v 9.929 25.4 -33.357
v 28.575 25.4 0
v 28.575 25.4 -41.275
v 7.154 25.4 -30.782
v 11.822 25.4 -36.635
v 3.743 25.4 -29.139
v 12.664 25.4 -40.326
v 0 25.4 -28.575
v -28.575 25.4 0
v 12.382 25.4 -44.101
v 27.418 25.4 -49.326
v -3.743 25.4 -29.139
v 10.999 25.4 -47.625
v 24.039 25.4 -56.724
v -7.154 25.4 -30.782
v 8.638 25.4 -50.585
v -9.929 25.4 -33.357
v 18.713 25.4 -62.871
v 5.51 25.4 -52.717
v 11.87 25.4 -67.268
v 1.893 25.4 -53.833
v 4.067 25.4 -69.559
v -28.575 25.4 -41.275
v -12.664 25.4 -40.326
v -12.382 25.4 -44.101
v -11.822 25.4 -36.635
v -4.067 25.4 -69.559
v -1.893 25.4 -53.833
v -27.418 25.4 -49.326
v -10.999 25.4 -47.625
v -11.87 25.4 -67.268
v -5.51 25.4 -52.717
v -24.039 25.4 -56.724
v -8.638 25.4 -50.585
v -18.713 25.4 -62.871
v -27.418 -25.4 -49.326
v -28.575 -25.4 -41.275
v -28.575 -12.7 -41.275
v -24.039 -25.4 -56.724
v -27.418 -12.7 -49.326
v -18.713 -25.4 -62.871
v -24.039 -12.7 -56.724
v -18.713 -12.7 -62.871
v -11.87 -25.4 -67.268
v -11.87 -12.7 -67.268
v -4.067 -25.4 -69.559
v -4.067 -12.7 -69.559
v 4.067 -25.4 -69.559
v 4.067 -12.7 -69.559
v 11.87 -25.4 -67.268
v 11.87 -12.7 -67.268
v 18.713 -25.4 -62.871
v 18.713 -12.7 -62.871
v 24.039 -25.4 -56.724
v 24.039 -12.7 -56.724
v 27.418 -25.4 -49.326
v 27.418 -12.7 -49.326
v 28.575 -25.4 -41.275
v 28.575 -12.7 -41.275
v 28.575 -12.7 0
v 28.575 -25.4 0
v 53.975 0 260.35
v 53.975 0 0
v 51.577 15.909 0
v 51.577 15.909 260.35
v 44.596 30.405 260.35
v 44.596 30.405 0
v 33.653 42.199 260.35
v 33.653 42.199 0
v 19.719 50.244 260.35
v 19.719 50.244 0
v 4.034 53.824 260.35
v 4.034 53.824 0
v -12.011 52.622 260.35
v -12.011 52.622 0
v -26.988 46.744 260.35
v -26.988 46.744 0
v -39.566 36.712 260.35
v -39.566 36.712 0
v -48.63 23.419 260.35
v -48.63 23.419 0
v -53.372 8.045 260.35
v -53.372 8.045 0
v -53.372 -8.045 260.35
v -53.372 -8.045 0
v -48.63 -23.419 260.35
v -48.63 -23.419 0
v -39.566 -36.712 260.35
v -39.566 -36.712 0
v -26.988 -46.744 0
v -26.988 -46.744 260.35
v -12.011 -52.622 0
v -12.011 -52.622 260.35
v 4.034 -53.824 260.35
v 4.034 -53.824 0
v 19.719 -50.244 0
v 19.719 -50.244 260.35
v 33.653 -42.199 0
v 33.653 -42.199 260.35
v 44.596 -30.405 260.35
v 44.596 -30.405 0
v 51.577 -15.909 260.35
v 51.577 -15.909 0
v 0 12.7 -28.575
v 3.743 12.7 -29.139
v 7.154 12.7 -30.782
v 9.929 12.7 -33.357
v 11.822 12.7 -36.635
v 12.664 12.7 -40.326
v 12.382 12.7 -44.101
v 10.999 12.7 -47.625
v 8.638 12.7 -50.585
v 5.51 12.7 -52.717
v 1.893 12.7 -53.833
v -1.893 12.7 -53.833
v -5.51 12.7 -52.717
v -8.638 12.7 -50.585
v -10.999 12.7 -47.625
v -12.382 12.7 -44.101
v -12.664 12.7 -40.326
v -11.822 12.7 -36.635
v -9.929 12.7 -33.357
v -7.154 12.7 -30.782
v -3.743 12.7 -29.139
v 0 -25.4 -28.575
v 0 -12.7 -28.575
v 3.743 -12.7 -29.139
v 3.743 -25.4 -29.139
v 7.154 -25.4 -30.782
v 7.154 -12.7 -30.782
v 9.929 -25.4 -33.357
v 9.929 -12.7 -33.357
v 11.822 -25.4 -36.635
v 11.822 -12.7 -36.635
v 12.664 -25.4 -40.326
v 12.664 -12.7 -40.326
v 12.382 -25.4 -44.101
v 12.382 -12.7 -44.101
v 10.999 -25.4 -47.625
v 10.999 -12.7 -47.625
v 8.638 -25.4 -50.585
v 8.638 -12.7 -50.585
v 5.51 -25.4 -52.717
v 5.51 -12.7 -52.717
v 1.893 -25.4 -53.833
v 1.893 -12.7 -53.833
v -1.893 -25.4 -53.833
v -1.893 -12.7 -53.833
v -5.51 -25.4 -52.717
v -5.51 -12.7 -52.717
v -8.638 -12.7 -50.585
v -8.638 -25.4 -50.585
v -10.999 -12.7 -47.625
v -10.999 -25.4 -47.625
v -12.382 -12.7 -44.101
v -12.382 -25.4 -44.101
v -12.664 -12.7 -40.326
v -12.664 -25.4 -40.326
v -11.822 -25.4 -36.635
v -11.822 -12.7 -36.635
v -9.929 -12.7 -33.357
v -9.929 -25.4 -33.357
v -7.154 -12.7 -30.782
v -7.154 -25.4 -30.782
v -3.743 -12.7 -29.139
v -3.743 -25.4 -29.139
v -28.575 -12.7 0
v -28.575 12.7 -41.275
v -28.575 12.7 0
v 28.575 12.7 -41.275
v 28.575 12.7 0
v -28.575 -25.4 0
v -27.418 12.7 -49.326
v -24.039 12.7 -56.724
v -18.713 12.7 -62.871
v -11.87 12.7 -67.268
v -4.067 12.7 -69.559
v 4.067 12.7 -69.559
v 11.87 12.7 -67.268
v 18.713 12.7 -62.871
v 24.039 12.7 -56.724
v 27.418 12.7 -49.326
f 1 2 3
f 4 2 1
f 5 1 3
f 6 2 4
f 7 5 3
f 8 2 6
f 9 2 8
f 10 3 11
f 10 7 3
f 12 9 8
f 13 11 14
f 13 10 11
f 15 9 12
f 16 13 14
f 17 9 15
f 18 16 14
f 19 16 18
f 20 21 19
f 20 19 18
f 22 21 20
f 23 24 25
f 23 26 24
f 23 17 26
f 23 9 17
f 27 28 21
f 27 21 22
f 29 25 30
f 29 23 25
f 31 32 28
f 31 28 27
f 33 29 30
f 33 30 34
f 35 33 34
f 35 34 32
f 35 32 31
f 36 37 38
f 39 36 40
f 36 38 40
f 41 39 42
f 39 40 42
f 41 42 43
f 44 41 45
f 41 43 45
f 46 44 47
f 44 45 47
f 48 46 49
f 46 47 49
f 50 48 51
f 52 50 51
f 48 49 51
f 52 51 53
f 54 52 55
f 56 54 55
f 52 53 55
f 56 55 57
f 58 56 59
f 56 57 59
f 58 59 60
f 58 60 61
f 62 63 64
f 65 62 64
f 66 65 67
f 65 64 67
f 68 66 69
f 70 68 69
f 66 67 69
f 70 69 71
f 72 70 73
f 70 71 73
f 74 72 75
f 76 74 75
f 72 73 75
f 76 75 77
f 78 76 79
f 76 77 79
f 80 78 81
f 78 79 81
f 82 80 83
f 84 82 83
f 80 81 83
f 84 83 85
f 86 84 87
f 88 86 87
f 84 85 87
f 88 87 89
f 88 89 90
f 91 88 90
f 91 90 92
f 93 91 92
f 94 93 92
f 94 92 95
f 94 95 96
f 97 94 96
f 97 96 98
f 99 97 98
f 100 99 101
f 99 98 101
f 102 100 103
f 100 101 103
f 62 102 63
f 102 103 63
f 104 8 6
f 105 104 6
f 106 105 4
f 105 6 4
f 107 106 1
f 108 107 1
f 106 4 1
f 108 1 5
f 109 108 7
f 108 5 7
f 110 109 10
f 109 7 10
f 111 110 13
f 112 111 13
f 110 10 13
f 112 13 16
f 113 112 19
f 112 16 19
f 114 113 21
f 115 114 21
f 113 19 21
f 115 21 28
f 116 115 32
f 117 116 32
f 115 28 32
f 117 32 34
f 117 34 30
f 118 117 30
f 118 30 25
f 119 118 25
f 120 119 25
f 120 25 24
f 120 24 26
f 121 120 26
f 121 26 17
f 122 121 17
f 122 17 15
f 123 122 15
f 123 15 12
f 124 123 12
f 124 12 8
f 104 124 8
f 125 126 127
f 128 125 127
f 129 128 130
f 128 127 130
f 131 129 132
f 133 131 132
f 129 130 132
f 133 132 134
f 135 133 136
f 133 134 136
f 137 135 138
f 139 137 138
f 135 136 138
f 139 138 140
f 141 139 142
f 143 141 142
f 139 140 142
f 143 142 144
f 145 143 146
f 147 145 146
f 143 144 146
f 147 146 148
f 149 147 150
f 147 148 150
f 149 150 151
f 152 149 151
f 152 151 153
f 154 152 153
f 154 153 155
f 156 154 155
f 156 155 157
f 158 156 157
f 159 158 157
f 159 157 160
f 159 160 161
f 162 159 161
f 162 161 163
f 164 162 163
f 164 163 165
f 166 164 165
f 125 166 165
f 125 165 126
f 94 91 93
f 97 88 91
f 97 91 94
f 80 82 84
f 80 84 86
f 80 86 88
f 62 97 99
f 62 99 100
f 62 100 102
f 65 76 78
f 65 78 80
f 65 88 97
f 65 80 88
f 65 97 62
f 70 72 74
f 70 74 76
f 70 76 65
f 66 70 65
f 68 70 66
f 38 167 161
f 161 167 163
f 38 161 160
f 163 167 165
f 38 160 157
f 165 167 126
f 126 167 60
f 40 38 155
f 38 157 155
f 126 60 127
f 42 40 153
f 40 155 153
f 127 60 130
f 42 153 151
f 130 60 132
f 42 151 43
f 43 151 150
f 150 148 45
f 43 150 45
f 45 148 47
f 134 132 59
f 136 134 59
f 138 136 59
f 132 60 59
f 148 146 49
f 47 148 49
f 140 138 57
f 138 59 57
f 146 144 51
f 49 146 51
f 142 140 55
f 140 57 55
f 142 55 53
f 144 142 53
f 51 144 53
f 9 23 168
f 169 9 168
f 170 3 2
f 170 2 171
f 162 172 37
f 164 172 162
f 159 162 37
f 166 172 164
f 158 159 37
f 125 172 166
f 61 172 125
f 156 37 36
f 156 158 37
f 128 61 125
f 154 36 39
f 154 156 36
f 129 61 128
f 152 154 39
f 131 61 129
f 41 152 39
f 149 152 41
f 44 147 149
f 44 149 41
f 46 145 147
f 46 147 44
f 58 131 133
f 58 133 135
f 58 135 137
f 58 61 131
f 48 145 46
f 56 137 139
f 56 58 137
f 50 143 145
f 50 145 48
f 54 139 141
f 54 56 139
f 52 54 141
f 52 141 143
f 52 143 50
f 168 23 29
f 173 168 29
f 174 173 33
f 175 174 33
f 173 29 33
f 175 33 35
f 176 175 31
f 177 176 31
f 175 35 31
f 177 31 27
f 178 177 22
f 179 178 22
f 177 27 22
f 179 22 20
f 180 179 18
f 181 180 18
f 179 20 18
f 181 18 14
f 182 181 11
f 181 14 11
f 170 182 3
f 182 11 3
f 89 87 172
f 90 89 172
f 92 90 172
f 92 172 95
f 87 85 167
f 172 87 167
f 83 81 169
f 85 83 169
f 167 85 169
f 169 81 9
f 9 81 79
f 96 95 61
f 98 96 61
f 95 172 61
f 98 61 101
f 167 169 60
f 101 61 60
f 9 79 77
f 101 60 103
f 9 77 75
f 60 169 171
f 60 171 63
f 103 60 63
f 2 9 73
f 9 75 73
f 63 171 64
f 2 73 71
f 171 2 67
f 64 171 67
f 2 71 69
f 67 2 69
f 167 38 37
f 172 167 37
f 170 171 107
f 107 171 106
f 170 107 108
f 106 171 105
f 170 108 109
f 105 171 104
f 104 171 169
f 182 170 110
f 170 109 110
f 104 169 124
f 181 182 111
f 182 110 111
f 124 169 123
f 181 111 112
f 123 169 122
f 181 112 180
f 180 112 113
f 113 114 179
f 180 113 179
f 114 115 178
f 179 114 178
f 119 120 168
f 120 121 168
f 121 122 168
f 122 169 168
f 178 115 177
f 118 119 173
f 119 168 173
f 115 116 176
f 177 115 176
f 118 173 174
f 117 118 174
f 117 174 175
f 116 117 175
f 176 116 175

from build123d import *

# Parameters (mm, degrees)
SKETCH1_R          = 53.975
EXTRUDE1_DEPTH     = 260.35
SKETCH2_W          = 12.7
SKETCH2_H          = 69.85
EXTRUDE2_DEPTH     = 28.575
SKETCH3_R          = 12.7
CUT_EXTRUDE1_DEPTH = 278.481195309


with BuildPart() as part:
    # Sketch1 → Extrude1 (new body)
    with BuildSketch(Plane.XY):
        Circle(SKETCH1_R)
    extrude(amount=EXTRUDE1_DEPTH)

    # Sketch2 → Extrude2 (add, symmetric)
    with BuildSketch(Plane(origin=(0, 0, 0), x_dir=(0, -1, 0), z_dir=(1, 0, 0))):
        with Locations((-19.05, 34.925)):
            Rectangle(SKETCH2_W, SKETCH2_H)
        with Locations((19.05, 34.925)):
            Rectangle(SKETCH2_W, SKETCH2_H)
    extrude(amount=EXTRUDE2_DEPTH, both=True)

    # Sketch3 → Cut-Extrude1 (cut, through all)
    with BuildSketch(Plane(origin=(0, 25.4, 0), x_dir=(-1, 0, 0), z_dir=(0, 1, 0))):
        with Locations(Location((0, -41.275, 0), (0, 0, 90))):
            Circle(SKETCH3_R)
        with BuildLine():
            Line((-28.575, -41.275), (-28.575, -85.725))
            Line((-28.575, -85.725), (28.575, -85.725))
            Line((28.575, -85.725), (28.575, -41.275))
            ThreePointArc((28.575, -41.275), (0, -69.85), (-28.575, -41.275))
        make_face()
    extrude(amount=-CUT_EXTRUDE1_DEPTH, mode=Mode.SUBTRACT)


solid = part.part
